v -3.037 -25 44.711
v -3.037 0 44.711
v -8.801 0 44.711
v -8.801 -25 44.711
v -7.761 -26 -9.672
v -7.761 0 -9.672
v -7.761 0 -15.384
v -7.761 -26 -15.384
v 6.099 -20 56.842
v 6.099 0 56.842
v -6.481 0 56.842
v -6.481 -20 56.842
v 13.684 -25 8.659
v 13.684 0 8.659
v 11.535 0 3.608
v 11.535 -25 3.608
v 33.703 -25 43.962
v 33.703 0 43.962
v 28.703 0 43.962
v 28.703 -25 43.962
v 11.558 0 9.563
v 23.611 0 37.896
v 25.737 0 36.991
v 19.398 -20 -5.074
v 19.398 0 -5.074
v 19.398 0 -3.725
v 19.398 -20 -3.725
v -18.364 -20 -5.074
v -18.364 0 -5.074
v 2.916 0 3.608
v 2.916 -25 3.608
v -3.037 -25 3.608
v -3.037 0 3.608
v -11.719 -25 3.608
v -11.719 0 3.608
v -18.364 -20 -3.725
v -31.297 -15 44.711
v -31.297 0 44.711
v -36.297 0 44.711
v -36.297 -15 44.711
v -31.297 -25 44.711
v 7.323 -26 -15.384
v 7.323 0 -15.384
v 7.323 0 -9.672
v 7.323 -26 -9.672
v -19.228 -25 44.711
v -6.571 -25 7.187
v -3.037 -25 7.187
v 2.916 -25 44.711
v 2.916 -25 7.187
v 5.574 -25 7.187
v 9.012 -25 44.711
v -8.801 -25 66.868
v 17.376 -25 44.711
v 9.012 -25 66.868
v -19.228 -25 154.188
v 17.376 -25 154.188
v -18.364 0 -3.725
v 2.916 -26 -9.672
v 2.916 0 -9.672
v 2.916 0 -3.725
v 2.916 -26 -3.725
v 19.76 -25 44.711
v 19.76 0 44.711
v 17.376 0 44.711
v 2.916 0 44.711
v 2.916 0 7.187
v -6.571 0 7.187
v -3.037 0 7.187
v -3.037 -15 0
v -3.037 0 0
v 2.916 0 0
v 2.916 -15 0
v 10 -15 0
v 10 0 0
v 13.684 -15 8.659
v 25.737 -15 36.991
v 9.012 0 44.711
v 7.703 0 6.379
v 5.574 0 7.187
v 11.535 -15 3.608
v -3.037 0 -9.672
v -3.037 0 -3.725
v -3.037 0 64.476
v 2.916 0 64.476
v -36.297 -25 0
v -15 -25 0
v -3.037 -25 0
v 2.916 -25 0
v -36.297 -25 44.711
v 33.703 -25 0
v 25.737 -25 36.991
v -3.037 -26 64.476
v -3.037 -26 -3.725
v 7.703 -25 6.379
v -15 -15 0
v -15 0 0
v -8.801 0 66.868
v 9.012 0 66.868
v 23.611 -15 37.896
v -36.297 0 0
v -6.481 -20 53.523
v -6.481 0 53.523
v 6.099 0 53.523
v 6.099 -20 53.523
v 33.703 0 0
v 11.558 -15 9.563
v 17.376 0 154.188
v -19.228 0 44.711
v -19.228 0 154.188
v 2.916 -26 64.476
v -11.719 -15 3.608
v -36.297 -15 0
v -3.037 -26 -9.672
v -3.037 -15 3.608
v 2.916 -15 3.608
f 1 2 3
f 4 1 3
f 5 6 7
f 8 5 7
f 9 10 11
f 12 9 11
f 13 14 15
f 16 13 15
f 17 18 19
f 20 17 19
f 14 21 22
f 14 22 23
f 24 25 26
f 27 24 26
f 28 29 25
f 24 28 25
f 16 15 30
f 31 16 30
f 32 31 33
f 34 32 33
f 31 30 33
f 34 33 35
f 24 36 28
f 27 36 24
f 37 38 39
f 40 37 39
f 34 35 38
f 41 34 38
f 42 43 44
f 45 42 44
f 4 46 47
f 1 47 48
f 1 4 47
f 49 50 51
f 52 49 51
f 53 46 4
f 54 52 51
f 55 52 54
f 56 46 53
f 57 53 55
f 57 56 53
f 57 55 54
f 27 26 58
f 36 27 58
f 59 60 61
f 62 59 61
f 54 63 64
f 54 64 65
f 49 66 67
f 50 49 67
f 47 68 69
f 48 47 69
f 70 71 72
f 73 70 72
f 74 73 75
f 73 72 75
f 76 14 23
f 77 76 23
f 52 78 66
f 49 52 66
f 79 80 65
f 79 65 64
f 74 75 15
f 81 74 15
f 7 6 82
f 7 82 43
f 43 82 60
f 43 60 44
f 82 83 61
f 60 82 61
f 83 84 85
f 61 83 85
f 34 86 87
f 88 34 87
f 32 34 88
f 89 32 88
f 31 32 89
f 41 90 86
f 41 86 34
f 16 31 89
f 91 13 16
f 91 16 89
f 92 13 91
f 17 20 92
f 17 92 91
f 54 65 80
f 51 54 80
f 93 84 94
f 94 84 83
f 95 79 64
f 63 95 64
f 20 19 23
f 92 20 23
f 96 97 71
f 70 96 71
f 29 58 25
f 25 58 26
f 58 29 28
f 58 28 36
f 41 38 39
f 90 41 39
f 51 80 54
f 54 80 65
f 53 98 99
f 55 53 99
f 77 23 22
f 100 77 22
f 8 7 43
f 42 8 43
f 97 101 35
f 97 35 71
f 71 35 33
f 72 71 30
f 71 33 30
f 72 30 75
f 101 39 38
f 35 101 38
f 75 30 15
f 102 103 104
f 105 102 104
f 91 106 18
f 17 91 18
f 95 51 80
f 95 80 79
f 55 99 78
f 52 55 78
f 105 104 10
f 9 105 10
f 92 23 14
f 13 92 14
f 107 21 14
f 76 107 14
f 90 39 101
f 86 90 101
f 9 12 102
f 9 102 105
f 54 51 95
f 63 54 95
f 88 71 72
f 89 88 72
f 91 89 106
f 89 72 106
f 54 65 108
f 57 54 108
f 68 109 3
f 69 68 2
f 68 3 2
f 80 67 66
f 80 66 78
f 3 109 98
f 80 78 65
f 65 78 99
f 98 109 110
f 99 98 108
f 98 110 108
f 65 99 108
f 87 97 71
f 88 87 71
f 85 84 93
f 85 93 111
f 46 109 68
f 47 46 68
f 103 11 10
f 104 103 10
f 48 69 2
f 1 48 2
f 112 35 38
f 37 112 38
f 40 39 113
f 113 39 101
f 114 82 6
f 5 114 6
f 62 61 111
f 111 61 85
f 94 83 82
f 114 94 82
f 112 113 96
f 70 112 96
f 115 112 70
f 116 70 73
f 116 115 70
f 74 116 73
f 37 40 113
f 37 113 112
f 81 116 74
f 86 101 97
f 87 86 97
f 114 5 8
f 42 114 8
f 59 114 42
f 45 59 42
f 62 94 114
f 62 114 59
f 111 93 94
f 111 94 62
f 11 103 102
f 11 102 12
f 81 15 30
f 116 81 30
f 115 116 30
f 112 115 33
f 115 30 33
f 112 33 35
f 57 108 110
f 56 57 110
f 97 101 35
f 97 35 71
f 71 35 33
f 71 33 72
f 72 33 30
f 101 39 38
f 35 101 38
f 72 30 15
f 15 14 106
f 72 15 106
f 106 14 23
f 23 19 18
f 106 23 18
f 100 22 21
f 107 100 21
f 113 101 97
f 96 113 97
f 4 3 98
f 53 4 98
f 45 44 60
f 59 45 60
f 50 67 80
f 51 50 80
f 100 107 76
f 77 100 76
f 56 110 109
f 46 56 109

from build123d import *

# Parameters (mm, degrees)
F1_DEPTH = 25
F2_DEPTH = 25
F0_W     = 5.9533766471
F0_H     = 3.6081648873
F3_DEPTH = 25
F4_DEPTH = 15
F0_H_2   = 3.3184252679
F0_H_3   = 4.5973956585
F0_H_4   = 3.5789706303
F0_H_5   = 7.6343305409
F0_H_6   = 1.3497583568
F0_H_7   = 37.5237402231
F0_H_8   = 8.8124598652
F0_H_9   = 3.724694252
F5_DEPTH = 26
F0_W_2   = 16.4814870805
F0_W_3   = 15.3268058784
F6_DEPTH = 20
F0_W_4   = 3.1829625368
F0_W_5   = 3.4437016584
F7_DEPTH = 20


with BuildPart() as f1:
    # F0 (on Front) → F1 (new body)
    with BuildSketch(Plane.XZ):
        Polygon((-6.570763886, 7.1871355176), (-3.0373330228, 7.1871355176), (-3.0373330228, 44.7108757407), (-8.8012386113, 44.7108757407), (-8.8012386113, 66.8681040406), (9.0117957443, 66.8681040406), (9.0117957443, 44.7108757407), (2.9160436243, 44.7108757407), (2.9160436243, 7.1871355176), (5.5738165975, 7.1871355176), (17.3762962222, 44.7108757407), (17.3762962222, 154.1877835989), (-19.2284993827, 154.1877835989), (-19.2284993827, 44.7108757407), align=None)
    extrude(amount=F1_DEPTH)


with BuildPart() as f2:
    # F0 (on Front) → F2 (new body)
    with BuildSketch(Plane.XZ):
        Polygon((17.3762962222, 44.7108757407), (5.5738165975, 7.1871355176), (7.7029102343, 6.3787537654), (19.7596531361, 44.7108757407), align=None)
    extrude(amount=F2_DEPTH)


with BuildPart() as f3:
    # F0 (on Front) → F3 (new body)
    with BuildSketch(Plane.XZ):
        Polygon((13.683658185, 8.658802552), (11.5349981756, 3.6081648873), (10, 0), (15, 0), (33.7026296736, 43.9623790848), (28.7026296736, 43.9623790848), (25.7369572809, 36.991273083), align=None)
        Polygon((33.7026296736, 43.9623790848), (15, 0), (33.7026296736, 0), align=None)
        Polygon((11.5349981756, 3.6081648873), (2.9160436243, 3.6081648873), (2.9160436243, 0), (10, 0), align=None)
        with Locations((-0.0606446993, 1.8040824437)):
            Rectangle(F0_W, F0_H)
        Polygon((-3.0373330228, 3.6081648873), (-11.7186964588, 3.6081648873), (-10, 0), (-3.0373330228, 0), align=None)
        Polygon((-11.7186964588, 3.6081648873), (-31.2973703264, 44.7108757407), (-36.2973703264, 44.7108757407), (-15, 0), (-10, 0), align=None)
        Polygon((-15, 0), (-36.2973703264, 44.7108757407), (-36.2973703264, 0), align=None)
    extrude(amount=F3_DEPTH)


with BuildPart() as f4:
    # F0 (on Front) → F4 (new body)
    with BuildSketch(Plane.XZ):
        Polygon((11.5580922573, 9.5630682723), (13.683658185, 8.658802552), (25.7369572809, 36.991273083), (23.6113913532, 37.8955388033), align=None)
    extrude(amount=F4_DEPTH)


with BuildPart() as f4b:
    # F0 (on Front) → F4, piece 2 (new body)
    with BuildSketch(Plane.XZ):
        Polygon((-3.0373330228, 3.6081648873), (-11.7186964588, 3.6081648873), (-10, 0), (-3.0373330228, 0), align=None)
        Polygon((11.5349981756, 3.6081648873), (2.9160436243, 3.6081648873), (2.9160436243, 0), (10, 0), align=None)
        with Locations((-0.0606446993, 1.8040824437)):
            Rectangle(F0_W, F0_H)
        Polygon((-11.7186964588, 3.6081648873), (-31.2973703264, 44.7108757407), (-36.2973703264, 44.7108757407), (-15, 0), (-10, 0), align=None)
        Polygon((-15, 0), (-36.2973703264, 44.7108757407), (-36.2973703264, 0), align=None)
    extrude(amount=F4_DEPTH)


with BuildPart() as f5:
    # F0 (on Front) → F5 (new body)
    with BuildSketch(Plane.XZ):
        with Locations((-0.0606446993, 55.1825482398)):
            Rectangle(F0_W, F0_H_2)
        with Locations((-0.0606446993, -7.3731504381)):
            Rectangle(F0_W, F0_H_3)
        with Locations((-0.0606446993, 5.3976502025)):
            Rectangle(F0_W, F0_H_4)
        with Locations((-0.0606446993, 60.6589261442)):
            Rectangle(F0_W, F0_H_5)
        Polygon((2.9160436243, -9.6718482673), (-3.0373330228, -9.6718482673), (-7.7612702735, -9.6718482673), (-7.7612702735, -15.3836756945), (7.323355414, -15.3836756945), (7.323355414, -9.6718482673), align=None)
        with Locations((-0.0606446993, -4.3995734304)):
            Rectangle(F0_W, F0_H_6)
        with Locations((-0.0606446993, 25.9490056292)):
            Rectangle(F0_W, F0_H_7)
        with Locations((-0.0606446993, 49.1171056733)):
            Rectangle(F0_W, F0_H_8)
        with Locations((-0.0606446993, -1.862347126)):
            Rectangle(F0_W, F0_H_9)
        with Locations((-0.0606446993, 1.8040824437)):
            Rectangle(F0_W, F0_H)
    extrude(amount=F5_DEPTH)


with BuildPart() as f6:
    # F0 (on Front) → F6 (new body)
    with BuildSketch(Plane.XZ):
        with Locations((11.1567871645, -4.3995734304)):
            Rectangle(F0_W_2, F0_H_6)
        with Locations((-10.700735962, -4.3995734304)):
            Rectangle(F0_W_3, F0_H_6)
        with Locations((-0.0606446993, -4.3995734304)):
            Rectangle(F0_W, F0_H_6)
    extrude(amount=F6_DEPTH)


with BuildPart() as f7:
    # F0 (on Front) → F7 (new body)
    with BuildSketch(Plane.XZ):
        with Locations((-0.0606446993, 55.1825482398)):
            Rectangle(F0_W, F0_H_2)
        with Locations((4.5075248927, 55.1825482398)):
            Rectangle(F0_W_4, F0_H_2)
        with Locations((-4.759183852, 55.1825482398)):
            Rectangle(F0_W_5, F0_H_2)
    extrude(amount=F7_DEPTH)


solid = Compound([f1.part, f2.part, f3.part, f4.part, f4b.part, f5.part, f6.part, f7.part])
